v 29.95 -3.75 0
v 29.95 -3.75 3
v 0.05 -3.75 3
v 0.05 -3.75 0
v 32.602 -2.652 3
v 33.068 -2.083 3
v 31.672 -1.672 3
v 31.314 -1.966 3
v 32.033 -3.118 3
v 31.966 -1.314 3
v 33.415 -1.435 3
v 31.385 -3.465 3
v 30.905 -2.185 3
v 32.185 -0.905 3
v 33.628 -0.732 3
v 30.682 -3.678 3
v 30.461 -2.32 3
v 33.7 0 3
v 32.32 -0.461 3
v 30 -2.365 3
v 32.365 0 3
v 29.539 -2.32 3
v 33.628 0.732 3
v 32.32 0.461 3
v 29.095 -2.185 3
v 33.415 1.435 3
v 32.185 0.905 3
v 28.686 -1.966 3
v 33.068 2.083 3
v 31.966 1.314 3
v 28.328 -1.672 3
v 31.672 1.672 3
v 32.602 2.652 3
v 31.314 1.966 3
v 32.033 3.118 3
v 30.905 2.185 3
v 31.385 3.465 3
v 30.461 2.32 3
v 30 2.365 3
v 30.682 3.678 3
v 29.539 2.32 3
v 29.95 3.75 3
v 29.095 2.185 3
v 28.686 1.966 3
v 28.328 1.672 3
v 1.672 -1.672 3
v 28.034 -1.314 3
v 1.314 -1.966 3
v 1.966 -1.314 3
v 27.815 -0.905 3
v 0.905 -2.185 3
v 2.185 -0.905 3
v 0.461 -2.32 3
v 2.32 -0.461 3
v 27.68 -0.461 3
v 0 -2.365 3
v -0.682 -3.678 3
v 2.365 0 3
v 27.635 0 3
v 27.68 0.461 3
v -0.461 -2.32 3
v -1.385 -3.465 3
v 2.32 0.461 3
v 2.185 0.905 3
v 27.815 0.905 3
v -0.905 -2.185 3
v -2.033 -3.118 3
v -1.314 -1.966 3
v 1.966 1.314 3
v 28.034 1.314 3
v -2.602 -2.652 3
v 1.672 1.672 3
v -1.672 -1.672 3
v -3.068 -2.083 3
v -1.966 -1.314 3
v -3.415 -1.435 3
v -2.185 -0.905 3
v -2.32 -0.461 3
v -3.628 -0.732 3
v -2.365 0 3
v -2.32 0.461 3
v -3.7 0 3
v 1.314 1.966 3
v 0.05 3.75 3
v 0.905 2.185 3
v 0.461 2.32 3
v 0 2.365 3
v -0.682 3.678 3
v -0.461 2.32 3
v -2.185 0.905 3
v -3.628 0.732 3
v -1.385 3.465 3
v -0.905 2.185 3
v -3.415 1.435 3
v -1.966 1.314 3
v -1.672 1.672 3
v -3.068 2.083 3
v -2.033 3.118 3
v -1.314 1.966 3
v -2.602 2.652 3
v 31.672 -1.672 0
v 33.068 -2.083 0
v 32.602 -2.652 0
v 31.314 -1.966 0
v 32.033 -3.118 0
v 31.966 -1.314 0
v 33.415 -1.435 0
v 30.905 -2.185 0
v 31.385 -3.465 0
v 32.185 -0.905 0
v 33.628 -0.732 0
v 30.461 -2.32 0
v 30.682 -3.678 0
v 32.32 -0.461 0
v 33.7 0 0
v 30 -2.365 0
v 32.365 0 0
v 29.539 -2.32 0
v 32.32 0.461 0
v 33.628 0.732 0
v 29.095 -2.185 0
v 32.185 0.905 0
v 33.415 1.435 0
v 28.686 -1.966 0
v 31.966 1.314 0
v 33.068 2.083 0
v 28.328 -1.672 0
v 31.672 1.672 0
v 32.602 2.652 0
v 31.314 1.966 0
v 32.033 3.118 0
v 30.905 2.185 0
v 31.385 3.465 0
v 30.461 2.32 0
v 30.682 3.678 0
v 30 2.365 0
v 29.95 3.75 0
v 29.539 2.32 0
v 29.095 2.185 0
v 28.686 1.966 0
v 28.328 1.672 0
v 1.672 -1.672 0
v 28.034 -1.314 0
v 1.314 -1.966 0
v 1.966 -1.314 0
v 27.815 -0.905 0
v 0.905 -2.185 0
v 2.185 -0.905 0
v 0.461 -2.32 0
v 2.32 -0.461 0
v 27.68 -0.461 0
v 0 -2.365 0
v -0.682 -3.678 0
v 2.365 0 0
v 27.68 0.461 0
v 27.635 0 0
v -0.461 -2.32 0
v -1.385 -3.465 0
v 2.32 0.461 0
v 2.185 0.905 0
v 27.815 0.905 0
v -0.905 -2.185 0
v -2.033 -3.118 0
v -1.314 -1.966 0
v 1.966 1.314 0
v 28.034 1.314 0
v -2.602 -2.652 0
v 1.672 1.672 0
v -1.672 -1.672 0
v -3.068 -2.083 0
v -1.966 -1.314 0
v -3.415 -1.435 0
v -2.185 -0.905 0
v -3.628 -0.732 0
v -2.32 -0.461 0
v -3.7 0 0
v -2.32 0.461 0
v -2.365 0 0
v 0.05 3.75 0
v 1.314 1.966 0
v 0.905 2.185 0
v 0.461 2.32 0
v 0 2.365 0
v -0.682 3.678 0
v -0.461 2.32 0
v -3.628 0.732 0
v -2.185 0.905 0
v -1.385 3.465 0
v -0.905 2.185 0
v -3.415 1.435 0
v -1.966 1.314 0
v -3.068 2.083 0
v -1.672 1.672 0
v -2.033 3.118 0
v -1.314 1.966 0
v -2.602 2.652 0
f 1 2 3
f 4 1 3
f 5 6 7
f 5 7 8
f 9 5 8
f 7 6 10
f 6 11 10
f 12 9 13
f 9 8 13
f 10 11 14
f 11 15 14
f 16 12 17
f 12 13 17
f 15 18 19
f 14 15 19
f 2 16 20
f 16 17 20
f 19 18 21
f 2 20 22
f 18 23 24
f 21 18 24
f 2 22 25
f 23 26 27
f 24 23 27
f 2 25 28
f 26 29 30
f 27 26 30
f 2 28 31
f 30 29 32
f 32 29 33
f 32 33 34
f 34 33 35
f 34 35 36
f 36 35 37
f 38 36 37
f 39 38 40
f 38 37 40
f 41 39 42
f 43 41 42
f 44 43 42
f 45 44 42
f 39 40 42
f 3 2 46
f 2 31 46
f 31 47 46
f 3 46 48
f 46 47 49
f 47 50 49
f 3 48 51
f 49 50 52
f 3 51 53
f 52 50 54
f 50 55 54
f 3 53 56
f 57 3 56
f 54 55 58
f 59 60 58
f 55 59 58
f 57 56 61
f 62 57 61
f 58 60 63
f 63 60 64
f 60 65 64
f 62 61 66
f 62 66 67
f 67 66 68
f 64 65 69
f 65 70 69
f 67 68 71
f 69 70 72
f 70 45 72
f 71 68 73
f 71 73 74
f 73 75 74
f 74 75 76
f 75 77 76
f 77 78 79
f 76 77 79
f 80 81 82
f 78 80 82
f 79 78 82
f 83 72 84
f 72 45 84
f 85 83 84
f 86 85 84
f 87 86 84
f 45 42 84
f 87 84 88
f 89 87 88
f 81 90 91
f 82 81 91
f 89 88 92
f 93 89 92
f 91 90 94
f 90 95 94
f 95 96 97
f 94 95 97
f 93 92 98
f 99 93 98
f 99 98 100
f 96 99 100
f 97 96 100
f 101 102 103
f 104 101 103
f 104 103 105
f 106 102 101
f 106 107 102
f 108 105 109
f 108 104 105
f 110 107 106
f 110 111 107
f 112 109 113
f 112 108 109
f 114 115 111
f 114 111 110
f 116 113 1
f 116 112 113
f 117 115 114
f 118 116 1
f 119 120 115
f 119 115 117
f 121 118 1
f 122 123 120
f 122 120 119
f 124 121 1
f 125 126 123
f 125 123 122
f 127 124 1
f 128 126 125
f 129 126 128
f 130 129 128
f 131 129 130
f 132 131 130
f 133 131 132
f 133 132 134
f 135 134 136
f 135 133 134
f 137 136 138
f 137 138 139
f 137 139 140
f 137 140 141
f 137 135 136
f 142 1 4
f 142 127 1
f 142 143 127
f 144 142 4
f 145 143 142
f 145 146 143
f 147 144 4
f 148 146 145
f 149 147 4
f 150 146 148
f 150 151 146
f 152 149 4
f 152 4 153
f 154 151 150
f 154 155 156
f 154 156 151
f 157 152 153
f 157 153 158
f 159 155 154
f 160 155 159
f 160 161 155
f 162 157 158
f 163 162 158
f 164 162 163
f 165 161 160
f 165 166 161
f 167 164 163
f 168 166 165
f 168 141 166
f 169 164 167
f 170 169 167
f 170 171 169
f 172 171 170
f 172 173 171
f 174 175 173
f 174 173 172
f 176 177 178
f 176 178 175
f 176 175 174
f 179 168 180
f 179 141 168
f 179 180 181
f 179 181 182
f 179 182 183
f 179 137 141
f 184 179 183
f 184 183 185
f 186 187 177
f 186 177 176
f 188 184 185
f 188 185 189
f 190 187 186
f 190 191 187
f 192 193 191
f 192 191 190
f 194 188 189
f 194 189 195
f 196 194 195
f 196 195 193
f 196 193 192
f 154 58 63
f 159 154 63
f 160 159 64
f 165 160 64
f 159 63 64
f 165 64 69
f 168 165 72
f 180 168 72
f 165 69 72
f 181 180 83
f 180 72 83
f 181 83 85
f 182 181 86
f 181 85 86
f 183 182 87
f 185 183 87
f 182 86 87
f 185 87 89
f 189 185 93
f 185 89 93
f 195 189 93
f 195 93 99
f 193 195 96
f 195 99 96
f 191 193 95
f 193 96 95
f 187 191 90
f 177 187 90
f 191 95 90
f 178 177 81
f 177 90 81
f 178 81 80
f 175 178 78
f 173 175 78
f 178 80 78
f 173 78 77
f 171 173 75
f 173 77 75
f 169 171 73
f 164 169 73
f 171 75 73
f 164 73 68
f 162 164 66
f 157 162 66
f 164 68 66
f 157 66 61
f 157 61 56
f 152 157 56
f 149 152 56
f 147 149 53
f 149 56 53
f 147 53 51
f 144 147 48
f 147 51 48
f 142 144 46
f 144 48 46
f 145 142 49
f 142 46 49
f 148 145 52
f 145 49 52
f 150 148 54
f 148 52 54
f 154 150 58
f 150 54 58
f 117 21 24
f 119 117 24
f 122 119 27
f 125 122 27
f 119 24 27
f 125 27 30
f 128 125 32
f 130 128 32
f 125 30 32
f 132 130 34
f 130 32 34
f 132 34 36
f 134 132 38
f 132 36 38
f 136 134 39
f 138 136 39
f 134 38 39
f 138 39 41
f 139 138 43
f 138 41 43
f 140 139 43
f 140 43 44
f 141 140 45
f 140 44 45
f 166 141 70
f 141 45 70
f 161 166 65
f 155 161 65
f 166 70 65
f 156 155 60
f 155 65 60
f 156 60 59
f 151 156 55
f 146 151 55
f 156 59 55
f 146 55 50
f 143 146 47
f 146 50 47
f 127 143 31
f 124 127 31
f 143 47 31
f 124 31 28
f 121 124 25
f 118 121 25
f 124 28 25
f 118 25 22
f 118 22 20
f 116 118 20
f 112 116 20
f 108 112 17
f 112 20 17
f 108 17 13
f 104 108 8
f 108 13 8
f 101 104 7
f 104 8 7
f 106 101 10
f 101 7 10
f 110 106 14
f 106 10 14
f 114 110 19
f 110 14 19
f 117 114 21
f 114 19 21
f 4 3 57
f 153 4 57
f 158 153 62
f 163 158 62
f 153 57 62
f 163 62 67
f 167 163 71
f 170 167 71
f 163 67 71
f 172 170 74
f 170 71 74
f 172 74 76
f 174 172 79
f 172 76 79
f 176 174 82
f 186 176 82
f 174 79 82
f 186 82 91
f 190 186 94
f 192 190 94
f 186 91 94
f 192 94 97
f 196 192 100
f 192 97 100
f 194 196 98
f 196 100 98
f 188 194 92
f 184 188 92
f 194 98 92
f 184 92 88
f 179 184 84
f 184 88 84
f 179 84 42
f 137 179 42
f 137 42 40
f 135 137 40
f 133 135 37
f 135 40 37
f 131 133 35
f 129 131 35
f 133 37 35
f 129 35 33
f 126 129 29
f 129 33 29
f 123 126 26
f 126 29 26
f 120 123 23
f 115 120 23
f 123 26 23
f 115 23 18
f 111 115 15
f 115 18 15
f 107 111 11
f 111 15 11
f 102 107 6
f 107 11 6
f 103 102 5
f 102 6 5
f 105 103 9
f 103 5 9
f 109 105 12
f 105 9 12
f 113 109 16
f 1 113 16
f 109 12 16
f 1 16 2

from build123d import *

# Parameters (mm, degrees)
SKETCH1_R           = 2.395
BOSS_EXTRUDE1_DEPTH = 3
SKETCH2_R           = 2.365
BOSS_EXTRUDE2_DEPTH = 3


with BuildPart() as part:
    # Sketch1 → Boss-Extrude1 (new body)
    with BuildSketch(Plane.XY):
        with BuildLine():
            Line((0, 3), (30, 3))
            ThreePointArc((30, 3), (33, 0), (30, -3))
            Line((30, -3), (0, -3))
            ThreePointArc((0, -3), (-3, 0), (0, 3))
        make_face()
        Circle(SKETCH1_R, mode=Mode.SUBTRACT)
        with Locations((30, 0)):
            Circle(SKETCH1_R, mode=Mode.SUBTRACT)
    extrude(amount=BOSS_EXTRUDE1_DEPTH)

    # Sketch2 → Boss-Extrude2 (add)
    with BuildSketch(Plane.XY.offset(3)):
        with BuildLine():
            Line((0.05, 3.75), (29.95, 3.75))
            ThreePointArc((29.95, 3.75), (33.7, 0), (29.95, -3.75))
            Line((29.95, -3.75), (0.05, -3.75))
            ThreePointArc((0.05, -3.75), (-3.7, 0), (0.05, 3.75))
        make_face()
        Circle(SKETCH2_R, mode=Mode.SUBTRACT)
        with Locations((30, 0)):
            Circle(SKETCH2_R, mode=Mode.SUBTRACT)
    extrude(amount=-BOSS_EXTRUDE2_DEPTH)


solid = part.part
